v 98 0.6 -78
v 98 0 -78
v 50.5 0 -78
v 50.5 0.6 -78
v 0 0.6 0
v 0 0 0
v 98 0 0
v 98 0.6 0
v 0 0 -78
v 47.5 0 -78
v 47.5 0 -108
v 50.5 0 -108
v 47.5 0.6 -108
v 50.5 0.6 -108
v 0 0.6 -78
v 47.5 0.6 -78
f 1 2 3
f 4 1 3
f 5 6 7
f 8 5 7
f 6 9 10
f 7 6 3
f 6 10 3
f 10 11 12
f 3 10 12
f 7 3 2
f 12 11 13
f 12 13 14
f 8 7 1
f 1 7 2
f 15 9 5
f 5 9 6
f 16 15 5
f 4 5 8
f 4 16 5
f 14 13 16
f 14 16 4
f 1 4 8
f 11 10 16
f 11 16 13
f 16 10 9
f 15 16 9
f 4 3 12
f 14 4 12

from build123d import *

# Parameters (mm, degrees)
SKETCH_1_W      = 3
SKETCH_1_H      = 30
EXTRUDE_1_DEPTH = 0.6


with BuildPart() as part:
    # Эскиз1 → Бобышка-Вытянуть1 (new body)
    with BuildSketch(Plane(origin=(0, 0, 0), x_dir=(1, 0, 0), z_dir=(0, 1, 0))):
        Polygon((0, 78), (0, 0), (98, 0), (98, 78), (50.5, 78), (50.5, 48), (47.5, 48), (47.5, 78), align=None)
        with Locations((49, 93)):
            Rectangle(SKETCH_1_W, SKETCH_1_H)
        with Locations((49, 63)):
            Rectangle(SKETCH_1_W, SKETCH_1_H)
    extrude(amount=EXTRUDE_1_DEPTH)


solid = part.part
